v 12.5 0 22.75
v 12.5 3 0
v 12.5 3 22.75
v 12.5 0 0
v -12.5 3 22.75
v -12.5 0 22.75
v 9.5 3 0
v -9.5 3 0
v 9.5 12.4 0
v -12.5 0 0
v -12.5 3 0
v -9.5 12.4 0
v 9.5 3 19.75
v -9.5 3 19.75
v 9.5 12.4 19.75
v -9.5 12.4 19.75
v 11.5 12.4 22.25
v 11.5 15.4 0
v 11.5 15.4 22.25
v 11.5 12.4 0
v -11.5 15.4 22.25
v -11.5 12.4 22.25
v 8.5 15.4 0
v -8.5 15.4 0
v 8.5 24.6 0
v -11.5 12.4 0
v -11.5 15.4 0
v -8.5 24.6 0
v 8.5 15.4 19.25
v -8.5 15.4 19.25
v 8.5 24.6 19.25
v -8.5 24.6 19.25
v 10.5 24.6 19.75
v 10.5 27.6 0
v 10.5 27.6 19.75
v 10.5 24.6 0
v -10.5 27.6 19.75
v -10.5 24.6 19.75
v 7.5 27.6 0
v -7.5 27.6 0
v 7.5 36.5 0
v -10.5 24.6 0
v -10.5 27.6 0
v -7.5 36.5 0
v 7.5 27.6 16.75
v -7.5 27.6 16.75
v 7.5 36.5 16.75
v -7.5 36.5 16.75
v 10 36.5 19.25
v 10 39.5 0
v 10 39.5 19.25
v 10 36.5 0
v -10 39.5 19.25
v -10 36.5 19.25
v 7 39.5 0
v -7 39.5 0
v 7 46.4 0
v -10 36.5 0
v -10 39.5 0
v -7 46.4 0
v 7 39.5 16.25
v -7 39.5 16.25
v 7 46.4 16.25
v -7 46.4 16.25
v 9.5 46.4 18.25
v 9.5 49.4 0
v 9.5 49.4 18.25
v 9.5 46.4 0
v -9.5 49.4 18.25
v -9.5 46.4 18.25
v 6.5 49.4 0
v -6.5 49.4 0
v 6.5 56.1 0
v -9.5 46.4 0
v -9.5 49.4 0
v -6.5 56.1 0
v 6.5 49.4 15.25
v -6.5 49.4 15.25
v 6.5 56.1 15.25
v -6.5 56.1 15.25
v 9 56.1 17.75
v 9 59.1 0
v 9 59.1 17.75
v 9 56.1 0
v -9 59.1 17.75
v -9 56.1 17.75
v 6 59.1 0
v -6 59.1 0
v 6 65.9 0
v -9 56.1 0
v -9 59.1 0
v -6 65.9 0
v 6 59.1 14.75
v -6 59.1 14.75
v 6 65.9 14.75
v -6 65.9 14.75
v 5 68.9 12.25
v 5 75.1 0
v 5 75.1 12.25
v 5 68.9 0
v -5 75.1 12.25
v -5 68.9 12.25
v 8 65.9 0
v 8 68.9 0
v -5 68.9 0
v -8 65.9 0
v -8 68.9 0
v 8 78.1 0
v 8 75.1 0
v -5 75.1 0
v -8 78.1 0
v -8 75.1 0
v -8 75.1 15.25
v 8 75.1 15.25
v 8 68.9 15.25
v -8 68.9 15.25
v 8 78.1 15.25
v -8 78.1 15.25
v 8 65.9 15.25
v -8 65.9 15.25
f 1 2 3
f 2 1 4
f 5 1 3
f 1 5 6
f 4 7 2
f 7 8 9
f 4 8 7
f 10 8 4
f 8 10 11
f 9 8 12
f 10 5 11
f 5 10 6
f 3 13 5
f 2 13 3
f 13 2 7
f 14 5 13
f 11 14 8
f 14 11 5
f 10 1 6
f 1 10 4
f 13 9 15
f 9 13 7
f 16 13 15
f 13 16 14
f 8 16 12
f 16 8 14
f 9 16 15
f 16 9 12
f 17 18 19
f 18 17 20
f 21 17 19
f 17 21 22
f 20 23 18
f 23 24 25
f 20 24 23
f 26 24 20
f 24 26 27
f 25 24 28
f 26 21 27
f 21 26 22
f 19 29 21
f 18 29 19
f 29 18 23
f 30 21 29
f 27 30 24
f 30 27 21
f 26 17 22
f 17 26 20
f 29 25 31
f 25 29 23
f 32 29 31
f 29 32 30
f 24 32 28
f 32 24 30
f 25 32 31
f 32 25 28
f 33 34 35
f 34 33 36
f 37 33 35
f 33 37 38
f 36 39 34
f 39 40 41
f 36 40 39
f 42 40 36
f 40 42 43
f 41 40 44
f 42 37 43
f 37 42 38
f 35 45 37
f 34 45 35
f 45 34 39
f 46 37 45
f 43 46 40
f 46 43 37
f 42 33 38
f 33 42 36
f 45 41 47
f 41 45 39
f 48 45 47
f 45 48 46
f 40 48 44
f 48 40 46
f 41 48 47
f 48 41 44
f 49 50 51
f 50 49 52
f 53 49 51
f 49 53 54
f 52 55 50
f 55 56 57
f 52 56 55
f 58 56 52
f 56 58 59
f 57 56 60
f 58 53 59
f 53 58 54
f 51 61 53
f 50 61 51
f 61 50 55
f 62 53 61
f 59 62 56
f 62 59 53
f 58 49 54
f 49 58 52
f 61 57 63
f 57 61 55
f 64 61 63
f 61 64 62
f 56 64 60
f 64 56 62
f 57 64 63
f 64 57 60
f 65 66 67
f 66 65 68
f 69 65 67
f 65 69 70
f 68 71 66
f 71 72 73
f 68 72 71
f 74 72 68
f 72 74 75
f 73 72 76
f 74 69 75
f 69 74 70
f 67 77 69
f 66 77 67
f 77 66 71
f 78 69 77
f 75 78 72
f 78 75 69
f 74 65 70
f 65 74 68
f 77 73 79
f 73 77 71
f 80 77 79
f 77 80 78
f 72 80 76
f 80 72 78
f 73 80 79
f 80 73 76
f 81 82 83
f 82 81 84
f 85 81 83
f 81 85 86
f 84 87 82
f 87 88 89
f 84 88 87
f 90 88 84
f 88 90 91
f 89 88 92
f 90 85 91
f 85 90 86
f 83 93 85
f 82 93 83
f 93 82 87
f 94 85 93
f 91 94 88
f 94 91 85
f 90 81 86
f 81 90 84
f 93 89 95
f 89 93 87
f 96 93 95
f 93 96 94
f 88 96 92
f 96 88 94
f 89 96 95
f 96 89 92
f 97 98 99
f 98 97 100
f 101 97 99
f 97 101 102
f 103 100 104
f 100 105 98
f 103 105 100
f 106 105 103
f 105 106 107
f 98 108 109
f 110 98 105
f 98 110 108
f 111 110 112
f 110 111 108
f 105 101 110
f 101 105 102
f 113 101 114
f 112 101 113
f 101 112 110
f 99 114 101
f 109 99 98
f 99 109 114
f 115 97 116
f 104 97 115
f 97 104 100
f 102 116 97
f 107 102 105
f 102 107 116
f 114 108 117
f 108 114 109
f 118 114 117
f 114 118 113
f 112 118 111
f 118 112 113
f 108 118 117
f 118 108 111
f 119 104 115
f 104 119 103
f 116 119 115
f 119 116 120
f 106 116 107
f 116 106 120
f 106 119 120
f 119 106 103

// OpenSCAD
function sum (v, l = -1, o = 0, i = 0, r = 0) = i < l ? sum (v, l, o, i + 1, r + v [i][o]) : r;

wall   = 3.00;
cube_x = 0;
cube_y = 1;
cube_h = 2;

v = [
//  W     T     H (Width, Thickness, Height)
  [19, 9.40, 16.0], // 19mm
  [17, 9.20, 15.5], // 17mm
  [15, 8.90, 13.0], // 15mm
  [14, 6.90, 12.5], // 14mm
  [13, 6.70, 11.5], // 13mm
  [12, 6.80, 11.0], // 12mm
  [10, 6.20,  8.5], // 10mm
];

for (i = [0 : len (v) - 1]) {
  translate ([-((v [i][cube_x] + (wall * 2)) / 2), sum (v, i, cube_y) + (wall * i), 0]) {
    cube ([v [i][cube_x] + (wall * 2), wall, 3.75 + v [i][cube_h] + wall]);

    translate ([wall, wall, 0]) {
      cube ([v [i][cube_x], v [i][cube_y], 3.75 + v [i][cube_h]]);

      if (i == len (v) - 1) {
        translate ([-wall, v [i][cube_y], 0])
          cube ([v [i][cube_x] + (wall * 2), wall, 3.75 + v [i][cube_h] + wall]);
      }
    }
  }
}
